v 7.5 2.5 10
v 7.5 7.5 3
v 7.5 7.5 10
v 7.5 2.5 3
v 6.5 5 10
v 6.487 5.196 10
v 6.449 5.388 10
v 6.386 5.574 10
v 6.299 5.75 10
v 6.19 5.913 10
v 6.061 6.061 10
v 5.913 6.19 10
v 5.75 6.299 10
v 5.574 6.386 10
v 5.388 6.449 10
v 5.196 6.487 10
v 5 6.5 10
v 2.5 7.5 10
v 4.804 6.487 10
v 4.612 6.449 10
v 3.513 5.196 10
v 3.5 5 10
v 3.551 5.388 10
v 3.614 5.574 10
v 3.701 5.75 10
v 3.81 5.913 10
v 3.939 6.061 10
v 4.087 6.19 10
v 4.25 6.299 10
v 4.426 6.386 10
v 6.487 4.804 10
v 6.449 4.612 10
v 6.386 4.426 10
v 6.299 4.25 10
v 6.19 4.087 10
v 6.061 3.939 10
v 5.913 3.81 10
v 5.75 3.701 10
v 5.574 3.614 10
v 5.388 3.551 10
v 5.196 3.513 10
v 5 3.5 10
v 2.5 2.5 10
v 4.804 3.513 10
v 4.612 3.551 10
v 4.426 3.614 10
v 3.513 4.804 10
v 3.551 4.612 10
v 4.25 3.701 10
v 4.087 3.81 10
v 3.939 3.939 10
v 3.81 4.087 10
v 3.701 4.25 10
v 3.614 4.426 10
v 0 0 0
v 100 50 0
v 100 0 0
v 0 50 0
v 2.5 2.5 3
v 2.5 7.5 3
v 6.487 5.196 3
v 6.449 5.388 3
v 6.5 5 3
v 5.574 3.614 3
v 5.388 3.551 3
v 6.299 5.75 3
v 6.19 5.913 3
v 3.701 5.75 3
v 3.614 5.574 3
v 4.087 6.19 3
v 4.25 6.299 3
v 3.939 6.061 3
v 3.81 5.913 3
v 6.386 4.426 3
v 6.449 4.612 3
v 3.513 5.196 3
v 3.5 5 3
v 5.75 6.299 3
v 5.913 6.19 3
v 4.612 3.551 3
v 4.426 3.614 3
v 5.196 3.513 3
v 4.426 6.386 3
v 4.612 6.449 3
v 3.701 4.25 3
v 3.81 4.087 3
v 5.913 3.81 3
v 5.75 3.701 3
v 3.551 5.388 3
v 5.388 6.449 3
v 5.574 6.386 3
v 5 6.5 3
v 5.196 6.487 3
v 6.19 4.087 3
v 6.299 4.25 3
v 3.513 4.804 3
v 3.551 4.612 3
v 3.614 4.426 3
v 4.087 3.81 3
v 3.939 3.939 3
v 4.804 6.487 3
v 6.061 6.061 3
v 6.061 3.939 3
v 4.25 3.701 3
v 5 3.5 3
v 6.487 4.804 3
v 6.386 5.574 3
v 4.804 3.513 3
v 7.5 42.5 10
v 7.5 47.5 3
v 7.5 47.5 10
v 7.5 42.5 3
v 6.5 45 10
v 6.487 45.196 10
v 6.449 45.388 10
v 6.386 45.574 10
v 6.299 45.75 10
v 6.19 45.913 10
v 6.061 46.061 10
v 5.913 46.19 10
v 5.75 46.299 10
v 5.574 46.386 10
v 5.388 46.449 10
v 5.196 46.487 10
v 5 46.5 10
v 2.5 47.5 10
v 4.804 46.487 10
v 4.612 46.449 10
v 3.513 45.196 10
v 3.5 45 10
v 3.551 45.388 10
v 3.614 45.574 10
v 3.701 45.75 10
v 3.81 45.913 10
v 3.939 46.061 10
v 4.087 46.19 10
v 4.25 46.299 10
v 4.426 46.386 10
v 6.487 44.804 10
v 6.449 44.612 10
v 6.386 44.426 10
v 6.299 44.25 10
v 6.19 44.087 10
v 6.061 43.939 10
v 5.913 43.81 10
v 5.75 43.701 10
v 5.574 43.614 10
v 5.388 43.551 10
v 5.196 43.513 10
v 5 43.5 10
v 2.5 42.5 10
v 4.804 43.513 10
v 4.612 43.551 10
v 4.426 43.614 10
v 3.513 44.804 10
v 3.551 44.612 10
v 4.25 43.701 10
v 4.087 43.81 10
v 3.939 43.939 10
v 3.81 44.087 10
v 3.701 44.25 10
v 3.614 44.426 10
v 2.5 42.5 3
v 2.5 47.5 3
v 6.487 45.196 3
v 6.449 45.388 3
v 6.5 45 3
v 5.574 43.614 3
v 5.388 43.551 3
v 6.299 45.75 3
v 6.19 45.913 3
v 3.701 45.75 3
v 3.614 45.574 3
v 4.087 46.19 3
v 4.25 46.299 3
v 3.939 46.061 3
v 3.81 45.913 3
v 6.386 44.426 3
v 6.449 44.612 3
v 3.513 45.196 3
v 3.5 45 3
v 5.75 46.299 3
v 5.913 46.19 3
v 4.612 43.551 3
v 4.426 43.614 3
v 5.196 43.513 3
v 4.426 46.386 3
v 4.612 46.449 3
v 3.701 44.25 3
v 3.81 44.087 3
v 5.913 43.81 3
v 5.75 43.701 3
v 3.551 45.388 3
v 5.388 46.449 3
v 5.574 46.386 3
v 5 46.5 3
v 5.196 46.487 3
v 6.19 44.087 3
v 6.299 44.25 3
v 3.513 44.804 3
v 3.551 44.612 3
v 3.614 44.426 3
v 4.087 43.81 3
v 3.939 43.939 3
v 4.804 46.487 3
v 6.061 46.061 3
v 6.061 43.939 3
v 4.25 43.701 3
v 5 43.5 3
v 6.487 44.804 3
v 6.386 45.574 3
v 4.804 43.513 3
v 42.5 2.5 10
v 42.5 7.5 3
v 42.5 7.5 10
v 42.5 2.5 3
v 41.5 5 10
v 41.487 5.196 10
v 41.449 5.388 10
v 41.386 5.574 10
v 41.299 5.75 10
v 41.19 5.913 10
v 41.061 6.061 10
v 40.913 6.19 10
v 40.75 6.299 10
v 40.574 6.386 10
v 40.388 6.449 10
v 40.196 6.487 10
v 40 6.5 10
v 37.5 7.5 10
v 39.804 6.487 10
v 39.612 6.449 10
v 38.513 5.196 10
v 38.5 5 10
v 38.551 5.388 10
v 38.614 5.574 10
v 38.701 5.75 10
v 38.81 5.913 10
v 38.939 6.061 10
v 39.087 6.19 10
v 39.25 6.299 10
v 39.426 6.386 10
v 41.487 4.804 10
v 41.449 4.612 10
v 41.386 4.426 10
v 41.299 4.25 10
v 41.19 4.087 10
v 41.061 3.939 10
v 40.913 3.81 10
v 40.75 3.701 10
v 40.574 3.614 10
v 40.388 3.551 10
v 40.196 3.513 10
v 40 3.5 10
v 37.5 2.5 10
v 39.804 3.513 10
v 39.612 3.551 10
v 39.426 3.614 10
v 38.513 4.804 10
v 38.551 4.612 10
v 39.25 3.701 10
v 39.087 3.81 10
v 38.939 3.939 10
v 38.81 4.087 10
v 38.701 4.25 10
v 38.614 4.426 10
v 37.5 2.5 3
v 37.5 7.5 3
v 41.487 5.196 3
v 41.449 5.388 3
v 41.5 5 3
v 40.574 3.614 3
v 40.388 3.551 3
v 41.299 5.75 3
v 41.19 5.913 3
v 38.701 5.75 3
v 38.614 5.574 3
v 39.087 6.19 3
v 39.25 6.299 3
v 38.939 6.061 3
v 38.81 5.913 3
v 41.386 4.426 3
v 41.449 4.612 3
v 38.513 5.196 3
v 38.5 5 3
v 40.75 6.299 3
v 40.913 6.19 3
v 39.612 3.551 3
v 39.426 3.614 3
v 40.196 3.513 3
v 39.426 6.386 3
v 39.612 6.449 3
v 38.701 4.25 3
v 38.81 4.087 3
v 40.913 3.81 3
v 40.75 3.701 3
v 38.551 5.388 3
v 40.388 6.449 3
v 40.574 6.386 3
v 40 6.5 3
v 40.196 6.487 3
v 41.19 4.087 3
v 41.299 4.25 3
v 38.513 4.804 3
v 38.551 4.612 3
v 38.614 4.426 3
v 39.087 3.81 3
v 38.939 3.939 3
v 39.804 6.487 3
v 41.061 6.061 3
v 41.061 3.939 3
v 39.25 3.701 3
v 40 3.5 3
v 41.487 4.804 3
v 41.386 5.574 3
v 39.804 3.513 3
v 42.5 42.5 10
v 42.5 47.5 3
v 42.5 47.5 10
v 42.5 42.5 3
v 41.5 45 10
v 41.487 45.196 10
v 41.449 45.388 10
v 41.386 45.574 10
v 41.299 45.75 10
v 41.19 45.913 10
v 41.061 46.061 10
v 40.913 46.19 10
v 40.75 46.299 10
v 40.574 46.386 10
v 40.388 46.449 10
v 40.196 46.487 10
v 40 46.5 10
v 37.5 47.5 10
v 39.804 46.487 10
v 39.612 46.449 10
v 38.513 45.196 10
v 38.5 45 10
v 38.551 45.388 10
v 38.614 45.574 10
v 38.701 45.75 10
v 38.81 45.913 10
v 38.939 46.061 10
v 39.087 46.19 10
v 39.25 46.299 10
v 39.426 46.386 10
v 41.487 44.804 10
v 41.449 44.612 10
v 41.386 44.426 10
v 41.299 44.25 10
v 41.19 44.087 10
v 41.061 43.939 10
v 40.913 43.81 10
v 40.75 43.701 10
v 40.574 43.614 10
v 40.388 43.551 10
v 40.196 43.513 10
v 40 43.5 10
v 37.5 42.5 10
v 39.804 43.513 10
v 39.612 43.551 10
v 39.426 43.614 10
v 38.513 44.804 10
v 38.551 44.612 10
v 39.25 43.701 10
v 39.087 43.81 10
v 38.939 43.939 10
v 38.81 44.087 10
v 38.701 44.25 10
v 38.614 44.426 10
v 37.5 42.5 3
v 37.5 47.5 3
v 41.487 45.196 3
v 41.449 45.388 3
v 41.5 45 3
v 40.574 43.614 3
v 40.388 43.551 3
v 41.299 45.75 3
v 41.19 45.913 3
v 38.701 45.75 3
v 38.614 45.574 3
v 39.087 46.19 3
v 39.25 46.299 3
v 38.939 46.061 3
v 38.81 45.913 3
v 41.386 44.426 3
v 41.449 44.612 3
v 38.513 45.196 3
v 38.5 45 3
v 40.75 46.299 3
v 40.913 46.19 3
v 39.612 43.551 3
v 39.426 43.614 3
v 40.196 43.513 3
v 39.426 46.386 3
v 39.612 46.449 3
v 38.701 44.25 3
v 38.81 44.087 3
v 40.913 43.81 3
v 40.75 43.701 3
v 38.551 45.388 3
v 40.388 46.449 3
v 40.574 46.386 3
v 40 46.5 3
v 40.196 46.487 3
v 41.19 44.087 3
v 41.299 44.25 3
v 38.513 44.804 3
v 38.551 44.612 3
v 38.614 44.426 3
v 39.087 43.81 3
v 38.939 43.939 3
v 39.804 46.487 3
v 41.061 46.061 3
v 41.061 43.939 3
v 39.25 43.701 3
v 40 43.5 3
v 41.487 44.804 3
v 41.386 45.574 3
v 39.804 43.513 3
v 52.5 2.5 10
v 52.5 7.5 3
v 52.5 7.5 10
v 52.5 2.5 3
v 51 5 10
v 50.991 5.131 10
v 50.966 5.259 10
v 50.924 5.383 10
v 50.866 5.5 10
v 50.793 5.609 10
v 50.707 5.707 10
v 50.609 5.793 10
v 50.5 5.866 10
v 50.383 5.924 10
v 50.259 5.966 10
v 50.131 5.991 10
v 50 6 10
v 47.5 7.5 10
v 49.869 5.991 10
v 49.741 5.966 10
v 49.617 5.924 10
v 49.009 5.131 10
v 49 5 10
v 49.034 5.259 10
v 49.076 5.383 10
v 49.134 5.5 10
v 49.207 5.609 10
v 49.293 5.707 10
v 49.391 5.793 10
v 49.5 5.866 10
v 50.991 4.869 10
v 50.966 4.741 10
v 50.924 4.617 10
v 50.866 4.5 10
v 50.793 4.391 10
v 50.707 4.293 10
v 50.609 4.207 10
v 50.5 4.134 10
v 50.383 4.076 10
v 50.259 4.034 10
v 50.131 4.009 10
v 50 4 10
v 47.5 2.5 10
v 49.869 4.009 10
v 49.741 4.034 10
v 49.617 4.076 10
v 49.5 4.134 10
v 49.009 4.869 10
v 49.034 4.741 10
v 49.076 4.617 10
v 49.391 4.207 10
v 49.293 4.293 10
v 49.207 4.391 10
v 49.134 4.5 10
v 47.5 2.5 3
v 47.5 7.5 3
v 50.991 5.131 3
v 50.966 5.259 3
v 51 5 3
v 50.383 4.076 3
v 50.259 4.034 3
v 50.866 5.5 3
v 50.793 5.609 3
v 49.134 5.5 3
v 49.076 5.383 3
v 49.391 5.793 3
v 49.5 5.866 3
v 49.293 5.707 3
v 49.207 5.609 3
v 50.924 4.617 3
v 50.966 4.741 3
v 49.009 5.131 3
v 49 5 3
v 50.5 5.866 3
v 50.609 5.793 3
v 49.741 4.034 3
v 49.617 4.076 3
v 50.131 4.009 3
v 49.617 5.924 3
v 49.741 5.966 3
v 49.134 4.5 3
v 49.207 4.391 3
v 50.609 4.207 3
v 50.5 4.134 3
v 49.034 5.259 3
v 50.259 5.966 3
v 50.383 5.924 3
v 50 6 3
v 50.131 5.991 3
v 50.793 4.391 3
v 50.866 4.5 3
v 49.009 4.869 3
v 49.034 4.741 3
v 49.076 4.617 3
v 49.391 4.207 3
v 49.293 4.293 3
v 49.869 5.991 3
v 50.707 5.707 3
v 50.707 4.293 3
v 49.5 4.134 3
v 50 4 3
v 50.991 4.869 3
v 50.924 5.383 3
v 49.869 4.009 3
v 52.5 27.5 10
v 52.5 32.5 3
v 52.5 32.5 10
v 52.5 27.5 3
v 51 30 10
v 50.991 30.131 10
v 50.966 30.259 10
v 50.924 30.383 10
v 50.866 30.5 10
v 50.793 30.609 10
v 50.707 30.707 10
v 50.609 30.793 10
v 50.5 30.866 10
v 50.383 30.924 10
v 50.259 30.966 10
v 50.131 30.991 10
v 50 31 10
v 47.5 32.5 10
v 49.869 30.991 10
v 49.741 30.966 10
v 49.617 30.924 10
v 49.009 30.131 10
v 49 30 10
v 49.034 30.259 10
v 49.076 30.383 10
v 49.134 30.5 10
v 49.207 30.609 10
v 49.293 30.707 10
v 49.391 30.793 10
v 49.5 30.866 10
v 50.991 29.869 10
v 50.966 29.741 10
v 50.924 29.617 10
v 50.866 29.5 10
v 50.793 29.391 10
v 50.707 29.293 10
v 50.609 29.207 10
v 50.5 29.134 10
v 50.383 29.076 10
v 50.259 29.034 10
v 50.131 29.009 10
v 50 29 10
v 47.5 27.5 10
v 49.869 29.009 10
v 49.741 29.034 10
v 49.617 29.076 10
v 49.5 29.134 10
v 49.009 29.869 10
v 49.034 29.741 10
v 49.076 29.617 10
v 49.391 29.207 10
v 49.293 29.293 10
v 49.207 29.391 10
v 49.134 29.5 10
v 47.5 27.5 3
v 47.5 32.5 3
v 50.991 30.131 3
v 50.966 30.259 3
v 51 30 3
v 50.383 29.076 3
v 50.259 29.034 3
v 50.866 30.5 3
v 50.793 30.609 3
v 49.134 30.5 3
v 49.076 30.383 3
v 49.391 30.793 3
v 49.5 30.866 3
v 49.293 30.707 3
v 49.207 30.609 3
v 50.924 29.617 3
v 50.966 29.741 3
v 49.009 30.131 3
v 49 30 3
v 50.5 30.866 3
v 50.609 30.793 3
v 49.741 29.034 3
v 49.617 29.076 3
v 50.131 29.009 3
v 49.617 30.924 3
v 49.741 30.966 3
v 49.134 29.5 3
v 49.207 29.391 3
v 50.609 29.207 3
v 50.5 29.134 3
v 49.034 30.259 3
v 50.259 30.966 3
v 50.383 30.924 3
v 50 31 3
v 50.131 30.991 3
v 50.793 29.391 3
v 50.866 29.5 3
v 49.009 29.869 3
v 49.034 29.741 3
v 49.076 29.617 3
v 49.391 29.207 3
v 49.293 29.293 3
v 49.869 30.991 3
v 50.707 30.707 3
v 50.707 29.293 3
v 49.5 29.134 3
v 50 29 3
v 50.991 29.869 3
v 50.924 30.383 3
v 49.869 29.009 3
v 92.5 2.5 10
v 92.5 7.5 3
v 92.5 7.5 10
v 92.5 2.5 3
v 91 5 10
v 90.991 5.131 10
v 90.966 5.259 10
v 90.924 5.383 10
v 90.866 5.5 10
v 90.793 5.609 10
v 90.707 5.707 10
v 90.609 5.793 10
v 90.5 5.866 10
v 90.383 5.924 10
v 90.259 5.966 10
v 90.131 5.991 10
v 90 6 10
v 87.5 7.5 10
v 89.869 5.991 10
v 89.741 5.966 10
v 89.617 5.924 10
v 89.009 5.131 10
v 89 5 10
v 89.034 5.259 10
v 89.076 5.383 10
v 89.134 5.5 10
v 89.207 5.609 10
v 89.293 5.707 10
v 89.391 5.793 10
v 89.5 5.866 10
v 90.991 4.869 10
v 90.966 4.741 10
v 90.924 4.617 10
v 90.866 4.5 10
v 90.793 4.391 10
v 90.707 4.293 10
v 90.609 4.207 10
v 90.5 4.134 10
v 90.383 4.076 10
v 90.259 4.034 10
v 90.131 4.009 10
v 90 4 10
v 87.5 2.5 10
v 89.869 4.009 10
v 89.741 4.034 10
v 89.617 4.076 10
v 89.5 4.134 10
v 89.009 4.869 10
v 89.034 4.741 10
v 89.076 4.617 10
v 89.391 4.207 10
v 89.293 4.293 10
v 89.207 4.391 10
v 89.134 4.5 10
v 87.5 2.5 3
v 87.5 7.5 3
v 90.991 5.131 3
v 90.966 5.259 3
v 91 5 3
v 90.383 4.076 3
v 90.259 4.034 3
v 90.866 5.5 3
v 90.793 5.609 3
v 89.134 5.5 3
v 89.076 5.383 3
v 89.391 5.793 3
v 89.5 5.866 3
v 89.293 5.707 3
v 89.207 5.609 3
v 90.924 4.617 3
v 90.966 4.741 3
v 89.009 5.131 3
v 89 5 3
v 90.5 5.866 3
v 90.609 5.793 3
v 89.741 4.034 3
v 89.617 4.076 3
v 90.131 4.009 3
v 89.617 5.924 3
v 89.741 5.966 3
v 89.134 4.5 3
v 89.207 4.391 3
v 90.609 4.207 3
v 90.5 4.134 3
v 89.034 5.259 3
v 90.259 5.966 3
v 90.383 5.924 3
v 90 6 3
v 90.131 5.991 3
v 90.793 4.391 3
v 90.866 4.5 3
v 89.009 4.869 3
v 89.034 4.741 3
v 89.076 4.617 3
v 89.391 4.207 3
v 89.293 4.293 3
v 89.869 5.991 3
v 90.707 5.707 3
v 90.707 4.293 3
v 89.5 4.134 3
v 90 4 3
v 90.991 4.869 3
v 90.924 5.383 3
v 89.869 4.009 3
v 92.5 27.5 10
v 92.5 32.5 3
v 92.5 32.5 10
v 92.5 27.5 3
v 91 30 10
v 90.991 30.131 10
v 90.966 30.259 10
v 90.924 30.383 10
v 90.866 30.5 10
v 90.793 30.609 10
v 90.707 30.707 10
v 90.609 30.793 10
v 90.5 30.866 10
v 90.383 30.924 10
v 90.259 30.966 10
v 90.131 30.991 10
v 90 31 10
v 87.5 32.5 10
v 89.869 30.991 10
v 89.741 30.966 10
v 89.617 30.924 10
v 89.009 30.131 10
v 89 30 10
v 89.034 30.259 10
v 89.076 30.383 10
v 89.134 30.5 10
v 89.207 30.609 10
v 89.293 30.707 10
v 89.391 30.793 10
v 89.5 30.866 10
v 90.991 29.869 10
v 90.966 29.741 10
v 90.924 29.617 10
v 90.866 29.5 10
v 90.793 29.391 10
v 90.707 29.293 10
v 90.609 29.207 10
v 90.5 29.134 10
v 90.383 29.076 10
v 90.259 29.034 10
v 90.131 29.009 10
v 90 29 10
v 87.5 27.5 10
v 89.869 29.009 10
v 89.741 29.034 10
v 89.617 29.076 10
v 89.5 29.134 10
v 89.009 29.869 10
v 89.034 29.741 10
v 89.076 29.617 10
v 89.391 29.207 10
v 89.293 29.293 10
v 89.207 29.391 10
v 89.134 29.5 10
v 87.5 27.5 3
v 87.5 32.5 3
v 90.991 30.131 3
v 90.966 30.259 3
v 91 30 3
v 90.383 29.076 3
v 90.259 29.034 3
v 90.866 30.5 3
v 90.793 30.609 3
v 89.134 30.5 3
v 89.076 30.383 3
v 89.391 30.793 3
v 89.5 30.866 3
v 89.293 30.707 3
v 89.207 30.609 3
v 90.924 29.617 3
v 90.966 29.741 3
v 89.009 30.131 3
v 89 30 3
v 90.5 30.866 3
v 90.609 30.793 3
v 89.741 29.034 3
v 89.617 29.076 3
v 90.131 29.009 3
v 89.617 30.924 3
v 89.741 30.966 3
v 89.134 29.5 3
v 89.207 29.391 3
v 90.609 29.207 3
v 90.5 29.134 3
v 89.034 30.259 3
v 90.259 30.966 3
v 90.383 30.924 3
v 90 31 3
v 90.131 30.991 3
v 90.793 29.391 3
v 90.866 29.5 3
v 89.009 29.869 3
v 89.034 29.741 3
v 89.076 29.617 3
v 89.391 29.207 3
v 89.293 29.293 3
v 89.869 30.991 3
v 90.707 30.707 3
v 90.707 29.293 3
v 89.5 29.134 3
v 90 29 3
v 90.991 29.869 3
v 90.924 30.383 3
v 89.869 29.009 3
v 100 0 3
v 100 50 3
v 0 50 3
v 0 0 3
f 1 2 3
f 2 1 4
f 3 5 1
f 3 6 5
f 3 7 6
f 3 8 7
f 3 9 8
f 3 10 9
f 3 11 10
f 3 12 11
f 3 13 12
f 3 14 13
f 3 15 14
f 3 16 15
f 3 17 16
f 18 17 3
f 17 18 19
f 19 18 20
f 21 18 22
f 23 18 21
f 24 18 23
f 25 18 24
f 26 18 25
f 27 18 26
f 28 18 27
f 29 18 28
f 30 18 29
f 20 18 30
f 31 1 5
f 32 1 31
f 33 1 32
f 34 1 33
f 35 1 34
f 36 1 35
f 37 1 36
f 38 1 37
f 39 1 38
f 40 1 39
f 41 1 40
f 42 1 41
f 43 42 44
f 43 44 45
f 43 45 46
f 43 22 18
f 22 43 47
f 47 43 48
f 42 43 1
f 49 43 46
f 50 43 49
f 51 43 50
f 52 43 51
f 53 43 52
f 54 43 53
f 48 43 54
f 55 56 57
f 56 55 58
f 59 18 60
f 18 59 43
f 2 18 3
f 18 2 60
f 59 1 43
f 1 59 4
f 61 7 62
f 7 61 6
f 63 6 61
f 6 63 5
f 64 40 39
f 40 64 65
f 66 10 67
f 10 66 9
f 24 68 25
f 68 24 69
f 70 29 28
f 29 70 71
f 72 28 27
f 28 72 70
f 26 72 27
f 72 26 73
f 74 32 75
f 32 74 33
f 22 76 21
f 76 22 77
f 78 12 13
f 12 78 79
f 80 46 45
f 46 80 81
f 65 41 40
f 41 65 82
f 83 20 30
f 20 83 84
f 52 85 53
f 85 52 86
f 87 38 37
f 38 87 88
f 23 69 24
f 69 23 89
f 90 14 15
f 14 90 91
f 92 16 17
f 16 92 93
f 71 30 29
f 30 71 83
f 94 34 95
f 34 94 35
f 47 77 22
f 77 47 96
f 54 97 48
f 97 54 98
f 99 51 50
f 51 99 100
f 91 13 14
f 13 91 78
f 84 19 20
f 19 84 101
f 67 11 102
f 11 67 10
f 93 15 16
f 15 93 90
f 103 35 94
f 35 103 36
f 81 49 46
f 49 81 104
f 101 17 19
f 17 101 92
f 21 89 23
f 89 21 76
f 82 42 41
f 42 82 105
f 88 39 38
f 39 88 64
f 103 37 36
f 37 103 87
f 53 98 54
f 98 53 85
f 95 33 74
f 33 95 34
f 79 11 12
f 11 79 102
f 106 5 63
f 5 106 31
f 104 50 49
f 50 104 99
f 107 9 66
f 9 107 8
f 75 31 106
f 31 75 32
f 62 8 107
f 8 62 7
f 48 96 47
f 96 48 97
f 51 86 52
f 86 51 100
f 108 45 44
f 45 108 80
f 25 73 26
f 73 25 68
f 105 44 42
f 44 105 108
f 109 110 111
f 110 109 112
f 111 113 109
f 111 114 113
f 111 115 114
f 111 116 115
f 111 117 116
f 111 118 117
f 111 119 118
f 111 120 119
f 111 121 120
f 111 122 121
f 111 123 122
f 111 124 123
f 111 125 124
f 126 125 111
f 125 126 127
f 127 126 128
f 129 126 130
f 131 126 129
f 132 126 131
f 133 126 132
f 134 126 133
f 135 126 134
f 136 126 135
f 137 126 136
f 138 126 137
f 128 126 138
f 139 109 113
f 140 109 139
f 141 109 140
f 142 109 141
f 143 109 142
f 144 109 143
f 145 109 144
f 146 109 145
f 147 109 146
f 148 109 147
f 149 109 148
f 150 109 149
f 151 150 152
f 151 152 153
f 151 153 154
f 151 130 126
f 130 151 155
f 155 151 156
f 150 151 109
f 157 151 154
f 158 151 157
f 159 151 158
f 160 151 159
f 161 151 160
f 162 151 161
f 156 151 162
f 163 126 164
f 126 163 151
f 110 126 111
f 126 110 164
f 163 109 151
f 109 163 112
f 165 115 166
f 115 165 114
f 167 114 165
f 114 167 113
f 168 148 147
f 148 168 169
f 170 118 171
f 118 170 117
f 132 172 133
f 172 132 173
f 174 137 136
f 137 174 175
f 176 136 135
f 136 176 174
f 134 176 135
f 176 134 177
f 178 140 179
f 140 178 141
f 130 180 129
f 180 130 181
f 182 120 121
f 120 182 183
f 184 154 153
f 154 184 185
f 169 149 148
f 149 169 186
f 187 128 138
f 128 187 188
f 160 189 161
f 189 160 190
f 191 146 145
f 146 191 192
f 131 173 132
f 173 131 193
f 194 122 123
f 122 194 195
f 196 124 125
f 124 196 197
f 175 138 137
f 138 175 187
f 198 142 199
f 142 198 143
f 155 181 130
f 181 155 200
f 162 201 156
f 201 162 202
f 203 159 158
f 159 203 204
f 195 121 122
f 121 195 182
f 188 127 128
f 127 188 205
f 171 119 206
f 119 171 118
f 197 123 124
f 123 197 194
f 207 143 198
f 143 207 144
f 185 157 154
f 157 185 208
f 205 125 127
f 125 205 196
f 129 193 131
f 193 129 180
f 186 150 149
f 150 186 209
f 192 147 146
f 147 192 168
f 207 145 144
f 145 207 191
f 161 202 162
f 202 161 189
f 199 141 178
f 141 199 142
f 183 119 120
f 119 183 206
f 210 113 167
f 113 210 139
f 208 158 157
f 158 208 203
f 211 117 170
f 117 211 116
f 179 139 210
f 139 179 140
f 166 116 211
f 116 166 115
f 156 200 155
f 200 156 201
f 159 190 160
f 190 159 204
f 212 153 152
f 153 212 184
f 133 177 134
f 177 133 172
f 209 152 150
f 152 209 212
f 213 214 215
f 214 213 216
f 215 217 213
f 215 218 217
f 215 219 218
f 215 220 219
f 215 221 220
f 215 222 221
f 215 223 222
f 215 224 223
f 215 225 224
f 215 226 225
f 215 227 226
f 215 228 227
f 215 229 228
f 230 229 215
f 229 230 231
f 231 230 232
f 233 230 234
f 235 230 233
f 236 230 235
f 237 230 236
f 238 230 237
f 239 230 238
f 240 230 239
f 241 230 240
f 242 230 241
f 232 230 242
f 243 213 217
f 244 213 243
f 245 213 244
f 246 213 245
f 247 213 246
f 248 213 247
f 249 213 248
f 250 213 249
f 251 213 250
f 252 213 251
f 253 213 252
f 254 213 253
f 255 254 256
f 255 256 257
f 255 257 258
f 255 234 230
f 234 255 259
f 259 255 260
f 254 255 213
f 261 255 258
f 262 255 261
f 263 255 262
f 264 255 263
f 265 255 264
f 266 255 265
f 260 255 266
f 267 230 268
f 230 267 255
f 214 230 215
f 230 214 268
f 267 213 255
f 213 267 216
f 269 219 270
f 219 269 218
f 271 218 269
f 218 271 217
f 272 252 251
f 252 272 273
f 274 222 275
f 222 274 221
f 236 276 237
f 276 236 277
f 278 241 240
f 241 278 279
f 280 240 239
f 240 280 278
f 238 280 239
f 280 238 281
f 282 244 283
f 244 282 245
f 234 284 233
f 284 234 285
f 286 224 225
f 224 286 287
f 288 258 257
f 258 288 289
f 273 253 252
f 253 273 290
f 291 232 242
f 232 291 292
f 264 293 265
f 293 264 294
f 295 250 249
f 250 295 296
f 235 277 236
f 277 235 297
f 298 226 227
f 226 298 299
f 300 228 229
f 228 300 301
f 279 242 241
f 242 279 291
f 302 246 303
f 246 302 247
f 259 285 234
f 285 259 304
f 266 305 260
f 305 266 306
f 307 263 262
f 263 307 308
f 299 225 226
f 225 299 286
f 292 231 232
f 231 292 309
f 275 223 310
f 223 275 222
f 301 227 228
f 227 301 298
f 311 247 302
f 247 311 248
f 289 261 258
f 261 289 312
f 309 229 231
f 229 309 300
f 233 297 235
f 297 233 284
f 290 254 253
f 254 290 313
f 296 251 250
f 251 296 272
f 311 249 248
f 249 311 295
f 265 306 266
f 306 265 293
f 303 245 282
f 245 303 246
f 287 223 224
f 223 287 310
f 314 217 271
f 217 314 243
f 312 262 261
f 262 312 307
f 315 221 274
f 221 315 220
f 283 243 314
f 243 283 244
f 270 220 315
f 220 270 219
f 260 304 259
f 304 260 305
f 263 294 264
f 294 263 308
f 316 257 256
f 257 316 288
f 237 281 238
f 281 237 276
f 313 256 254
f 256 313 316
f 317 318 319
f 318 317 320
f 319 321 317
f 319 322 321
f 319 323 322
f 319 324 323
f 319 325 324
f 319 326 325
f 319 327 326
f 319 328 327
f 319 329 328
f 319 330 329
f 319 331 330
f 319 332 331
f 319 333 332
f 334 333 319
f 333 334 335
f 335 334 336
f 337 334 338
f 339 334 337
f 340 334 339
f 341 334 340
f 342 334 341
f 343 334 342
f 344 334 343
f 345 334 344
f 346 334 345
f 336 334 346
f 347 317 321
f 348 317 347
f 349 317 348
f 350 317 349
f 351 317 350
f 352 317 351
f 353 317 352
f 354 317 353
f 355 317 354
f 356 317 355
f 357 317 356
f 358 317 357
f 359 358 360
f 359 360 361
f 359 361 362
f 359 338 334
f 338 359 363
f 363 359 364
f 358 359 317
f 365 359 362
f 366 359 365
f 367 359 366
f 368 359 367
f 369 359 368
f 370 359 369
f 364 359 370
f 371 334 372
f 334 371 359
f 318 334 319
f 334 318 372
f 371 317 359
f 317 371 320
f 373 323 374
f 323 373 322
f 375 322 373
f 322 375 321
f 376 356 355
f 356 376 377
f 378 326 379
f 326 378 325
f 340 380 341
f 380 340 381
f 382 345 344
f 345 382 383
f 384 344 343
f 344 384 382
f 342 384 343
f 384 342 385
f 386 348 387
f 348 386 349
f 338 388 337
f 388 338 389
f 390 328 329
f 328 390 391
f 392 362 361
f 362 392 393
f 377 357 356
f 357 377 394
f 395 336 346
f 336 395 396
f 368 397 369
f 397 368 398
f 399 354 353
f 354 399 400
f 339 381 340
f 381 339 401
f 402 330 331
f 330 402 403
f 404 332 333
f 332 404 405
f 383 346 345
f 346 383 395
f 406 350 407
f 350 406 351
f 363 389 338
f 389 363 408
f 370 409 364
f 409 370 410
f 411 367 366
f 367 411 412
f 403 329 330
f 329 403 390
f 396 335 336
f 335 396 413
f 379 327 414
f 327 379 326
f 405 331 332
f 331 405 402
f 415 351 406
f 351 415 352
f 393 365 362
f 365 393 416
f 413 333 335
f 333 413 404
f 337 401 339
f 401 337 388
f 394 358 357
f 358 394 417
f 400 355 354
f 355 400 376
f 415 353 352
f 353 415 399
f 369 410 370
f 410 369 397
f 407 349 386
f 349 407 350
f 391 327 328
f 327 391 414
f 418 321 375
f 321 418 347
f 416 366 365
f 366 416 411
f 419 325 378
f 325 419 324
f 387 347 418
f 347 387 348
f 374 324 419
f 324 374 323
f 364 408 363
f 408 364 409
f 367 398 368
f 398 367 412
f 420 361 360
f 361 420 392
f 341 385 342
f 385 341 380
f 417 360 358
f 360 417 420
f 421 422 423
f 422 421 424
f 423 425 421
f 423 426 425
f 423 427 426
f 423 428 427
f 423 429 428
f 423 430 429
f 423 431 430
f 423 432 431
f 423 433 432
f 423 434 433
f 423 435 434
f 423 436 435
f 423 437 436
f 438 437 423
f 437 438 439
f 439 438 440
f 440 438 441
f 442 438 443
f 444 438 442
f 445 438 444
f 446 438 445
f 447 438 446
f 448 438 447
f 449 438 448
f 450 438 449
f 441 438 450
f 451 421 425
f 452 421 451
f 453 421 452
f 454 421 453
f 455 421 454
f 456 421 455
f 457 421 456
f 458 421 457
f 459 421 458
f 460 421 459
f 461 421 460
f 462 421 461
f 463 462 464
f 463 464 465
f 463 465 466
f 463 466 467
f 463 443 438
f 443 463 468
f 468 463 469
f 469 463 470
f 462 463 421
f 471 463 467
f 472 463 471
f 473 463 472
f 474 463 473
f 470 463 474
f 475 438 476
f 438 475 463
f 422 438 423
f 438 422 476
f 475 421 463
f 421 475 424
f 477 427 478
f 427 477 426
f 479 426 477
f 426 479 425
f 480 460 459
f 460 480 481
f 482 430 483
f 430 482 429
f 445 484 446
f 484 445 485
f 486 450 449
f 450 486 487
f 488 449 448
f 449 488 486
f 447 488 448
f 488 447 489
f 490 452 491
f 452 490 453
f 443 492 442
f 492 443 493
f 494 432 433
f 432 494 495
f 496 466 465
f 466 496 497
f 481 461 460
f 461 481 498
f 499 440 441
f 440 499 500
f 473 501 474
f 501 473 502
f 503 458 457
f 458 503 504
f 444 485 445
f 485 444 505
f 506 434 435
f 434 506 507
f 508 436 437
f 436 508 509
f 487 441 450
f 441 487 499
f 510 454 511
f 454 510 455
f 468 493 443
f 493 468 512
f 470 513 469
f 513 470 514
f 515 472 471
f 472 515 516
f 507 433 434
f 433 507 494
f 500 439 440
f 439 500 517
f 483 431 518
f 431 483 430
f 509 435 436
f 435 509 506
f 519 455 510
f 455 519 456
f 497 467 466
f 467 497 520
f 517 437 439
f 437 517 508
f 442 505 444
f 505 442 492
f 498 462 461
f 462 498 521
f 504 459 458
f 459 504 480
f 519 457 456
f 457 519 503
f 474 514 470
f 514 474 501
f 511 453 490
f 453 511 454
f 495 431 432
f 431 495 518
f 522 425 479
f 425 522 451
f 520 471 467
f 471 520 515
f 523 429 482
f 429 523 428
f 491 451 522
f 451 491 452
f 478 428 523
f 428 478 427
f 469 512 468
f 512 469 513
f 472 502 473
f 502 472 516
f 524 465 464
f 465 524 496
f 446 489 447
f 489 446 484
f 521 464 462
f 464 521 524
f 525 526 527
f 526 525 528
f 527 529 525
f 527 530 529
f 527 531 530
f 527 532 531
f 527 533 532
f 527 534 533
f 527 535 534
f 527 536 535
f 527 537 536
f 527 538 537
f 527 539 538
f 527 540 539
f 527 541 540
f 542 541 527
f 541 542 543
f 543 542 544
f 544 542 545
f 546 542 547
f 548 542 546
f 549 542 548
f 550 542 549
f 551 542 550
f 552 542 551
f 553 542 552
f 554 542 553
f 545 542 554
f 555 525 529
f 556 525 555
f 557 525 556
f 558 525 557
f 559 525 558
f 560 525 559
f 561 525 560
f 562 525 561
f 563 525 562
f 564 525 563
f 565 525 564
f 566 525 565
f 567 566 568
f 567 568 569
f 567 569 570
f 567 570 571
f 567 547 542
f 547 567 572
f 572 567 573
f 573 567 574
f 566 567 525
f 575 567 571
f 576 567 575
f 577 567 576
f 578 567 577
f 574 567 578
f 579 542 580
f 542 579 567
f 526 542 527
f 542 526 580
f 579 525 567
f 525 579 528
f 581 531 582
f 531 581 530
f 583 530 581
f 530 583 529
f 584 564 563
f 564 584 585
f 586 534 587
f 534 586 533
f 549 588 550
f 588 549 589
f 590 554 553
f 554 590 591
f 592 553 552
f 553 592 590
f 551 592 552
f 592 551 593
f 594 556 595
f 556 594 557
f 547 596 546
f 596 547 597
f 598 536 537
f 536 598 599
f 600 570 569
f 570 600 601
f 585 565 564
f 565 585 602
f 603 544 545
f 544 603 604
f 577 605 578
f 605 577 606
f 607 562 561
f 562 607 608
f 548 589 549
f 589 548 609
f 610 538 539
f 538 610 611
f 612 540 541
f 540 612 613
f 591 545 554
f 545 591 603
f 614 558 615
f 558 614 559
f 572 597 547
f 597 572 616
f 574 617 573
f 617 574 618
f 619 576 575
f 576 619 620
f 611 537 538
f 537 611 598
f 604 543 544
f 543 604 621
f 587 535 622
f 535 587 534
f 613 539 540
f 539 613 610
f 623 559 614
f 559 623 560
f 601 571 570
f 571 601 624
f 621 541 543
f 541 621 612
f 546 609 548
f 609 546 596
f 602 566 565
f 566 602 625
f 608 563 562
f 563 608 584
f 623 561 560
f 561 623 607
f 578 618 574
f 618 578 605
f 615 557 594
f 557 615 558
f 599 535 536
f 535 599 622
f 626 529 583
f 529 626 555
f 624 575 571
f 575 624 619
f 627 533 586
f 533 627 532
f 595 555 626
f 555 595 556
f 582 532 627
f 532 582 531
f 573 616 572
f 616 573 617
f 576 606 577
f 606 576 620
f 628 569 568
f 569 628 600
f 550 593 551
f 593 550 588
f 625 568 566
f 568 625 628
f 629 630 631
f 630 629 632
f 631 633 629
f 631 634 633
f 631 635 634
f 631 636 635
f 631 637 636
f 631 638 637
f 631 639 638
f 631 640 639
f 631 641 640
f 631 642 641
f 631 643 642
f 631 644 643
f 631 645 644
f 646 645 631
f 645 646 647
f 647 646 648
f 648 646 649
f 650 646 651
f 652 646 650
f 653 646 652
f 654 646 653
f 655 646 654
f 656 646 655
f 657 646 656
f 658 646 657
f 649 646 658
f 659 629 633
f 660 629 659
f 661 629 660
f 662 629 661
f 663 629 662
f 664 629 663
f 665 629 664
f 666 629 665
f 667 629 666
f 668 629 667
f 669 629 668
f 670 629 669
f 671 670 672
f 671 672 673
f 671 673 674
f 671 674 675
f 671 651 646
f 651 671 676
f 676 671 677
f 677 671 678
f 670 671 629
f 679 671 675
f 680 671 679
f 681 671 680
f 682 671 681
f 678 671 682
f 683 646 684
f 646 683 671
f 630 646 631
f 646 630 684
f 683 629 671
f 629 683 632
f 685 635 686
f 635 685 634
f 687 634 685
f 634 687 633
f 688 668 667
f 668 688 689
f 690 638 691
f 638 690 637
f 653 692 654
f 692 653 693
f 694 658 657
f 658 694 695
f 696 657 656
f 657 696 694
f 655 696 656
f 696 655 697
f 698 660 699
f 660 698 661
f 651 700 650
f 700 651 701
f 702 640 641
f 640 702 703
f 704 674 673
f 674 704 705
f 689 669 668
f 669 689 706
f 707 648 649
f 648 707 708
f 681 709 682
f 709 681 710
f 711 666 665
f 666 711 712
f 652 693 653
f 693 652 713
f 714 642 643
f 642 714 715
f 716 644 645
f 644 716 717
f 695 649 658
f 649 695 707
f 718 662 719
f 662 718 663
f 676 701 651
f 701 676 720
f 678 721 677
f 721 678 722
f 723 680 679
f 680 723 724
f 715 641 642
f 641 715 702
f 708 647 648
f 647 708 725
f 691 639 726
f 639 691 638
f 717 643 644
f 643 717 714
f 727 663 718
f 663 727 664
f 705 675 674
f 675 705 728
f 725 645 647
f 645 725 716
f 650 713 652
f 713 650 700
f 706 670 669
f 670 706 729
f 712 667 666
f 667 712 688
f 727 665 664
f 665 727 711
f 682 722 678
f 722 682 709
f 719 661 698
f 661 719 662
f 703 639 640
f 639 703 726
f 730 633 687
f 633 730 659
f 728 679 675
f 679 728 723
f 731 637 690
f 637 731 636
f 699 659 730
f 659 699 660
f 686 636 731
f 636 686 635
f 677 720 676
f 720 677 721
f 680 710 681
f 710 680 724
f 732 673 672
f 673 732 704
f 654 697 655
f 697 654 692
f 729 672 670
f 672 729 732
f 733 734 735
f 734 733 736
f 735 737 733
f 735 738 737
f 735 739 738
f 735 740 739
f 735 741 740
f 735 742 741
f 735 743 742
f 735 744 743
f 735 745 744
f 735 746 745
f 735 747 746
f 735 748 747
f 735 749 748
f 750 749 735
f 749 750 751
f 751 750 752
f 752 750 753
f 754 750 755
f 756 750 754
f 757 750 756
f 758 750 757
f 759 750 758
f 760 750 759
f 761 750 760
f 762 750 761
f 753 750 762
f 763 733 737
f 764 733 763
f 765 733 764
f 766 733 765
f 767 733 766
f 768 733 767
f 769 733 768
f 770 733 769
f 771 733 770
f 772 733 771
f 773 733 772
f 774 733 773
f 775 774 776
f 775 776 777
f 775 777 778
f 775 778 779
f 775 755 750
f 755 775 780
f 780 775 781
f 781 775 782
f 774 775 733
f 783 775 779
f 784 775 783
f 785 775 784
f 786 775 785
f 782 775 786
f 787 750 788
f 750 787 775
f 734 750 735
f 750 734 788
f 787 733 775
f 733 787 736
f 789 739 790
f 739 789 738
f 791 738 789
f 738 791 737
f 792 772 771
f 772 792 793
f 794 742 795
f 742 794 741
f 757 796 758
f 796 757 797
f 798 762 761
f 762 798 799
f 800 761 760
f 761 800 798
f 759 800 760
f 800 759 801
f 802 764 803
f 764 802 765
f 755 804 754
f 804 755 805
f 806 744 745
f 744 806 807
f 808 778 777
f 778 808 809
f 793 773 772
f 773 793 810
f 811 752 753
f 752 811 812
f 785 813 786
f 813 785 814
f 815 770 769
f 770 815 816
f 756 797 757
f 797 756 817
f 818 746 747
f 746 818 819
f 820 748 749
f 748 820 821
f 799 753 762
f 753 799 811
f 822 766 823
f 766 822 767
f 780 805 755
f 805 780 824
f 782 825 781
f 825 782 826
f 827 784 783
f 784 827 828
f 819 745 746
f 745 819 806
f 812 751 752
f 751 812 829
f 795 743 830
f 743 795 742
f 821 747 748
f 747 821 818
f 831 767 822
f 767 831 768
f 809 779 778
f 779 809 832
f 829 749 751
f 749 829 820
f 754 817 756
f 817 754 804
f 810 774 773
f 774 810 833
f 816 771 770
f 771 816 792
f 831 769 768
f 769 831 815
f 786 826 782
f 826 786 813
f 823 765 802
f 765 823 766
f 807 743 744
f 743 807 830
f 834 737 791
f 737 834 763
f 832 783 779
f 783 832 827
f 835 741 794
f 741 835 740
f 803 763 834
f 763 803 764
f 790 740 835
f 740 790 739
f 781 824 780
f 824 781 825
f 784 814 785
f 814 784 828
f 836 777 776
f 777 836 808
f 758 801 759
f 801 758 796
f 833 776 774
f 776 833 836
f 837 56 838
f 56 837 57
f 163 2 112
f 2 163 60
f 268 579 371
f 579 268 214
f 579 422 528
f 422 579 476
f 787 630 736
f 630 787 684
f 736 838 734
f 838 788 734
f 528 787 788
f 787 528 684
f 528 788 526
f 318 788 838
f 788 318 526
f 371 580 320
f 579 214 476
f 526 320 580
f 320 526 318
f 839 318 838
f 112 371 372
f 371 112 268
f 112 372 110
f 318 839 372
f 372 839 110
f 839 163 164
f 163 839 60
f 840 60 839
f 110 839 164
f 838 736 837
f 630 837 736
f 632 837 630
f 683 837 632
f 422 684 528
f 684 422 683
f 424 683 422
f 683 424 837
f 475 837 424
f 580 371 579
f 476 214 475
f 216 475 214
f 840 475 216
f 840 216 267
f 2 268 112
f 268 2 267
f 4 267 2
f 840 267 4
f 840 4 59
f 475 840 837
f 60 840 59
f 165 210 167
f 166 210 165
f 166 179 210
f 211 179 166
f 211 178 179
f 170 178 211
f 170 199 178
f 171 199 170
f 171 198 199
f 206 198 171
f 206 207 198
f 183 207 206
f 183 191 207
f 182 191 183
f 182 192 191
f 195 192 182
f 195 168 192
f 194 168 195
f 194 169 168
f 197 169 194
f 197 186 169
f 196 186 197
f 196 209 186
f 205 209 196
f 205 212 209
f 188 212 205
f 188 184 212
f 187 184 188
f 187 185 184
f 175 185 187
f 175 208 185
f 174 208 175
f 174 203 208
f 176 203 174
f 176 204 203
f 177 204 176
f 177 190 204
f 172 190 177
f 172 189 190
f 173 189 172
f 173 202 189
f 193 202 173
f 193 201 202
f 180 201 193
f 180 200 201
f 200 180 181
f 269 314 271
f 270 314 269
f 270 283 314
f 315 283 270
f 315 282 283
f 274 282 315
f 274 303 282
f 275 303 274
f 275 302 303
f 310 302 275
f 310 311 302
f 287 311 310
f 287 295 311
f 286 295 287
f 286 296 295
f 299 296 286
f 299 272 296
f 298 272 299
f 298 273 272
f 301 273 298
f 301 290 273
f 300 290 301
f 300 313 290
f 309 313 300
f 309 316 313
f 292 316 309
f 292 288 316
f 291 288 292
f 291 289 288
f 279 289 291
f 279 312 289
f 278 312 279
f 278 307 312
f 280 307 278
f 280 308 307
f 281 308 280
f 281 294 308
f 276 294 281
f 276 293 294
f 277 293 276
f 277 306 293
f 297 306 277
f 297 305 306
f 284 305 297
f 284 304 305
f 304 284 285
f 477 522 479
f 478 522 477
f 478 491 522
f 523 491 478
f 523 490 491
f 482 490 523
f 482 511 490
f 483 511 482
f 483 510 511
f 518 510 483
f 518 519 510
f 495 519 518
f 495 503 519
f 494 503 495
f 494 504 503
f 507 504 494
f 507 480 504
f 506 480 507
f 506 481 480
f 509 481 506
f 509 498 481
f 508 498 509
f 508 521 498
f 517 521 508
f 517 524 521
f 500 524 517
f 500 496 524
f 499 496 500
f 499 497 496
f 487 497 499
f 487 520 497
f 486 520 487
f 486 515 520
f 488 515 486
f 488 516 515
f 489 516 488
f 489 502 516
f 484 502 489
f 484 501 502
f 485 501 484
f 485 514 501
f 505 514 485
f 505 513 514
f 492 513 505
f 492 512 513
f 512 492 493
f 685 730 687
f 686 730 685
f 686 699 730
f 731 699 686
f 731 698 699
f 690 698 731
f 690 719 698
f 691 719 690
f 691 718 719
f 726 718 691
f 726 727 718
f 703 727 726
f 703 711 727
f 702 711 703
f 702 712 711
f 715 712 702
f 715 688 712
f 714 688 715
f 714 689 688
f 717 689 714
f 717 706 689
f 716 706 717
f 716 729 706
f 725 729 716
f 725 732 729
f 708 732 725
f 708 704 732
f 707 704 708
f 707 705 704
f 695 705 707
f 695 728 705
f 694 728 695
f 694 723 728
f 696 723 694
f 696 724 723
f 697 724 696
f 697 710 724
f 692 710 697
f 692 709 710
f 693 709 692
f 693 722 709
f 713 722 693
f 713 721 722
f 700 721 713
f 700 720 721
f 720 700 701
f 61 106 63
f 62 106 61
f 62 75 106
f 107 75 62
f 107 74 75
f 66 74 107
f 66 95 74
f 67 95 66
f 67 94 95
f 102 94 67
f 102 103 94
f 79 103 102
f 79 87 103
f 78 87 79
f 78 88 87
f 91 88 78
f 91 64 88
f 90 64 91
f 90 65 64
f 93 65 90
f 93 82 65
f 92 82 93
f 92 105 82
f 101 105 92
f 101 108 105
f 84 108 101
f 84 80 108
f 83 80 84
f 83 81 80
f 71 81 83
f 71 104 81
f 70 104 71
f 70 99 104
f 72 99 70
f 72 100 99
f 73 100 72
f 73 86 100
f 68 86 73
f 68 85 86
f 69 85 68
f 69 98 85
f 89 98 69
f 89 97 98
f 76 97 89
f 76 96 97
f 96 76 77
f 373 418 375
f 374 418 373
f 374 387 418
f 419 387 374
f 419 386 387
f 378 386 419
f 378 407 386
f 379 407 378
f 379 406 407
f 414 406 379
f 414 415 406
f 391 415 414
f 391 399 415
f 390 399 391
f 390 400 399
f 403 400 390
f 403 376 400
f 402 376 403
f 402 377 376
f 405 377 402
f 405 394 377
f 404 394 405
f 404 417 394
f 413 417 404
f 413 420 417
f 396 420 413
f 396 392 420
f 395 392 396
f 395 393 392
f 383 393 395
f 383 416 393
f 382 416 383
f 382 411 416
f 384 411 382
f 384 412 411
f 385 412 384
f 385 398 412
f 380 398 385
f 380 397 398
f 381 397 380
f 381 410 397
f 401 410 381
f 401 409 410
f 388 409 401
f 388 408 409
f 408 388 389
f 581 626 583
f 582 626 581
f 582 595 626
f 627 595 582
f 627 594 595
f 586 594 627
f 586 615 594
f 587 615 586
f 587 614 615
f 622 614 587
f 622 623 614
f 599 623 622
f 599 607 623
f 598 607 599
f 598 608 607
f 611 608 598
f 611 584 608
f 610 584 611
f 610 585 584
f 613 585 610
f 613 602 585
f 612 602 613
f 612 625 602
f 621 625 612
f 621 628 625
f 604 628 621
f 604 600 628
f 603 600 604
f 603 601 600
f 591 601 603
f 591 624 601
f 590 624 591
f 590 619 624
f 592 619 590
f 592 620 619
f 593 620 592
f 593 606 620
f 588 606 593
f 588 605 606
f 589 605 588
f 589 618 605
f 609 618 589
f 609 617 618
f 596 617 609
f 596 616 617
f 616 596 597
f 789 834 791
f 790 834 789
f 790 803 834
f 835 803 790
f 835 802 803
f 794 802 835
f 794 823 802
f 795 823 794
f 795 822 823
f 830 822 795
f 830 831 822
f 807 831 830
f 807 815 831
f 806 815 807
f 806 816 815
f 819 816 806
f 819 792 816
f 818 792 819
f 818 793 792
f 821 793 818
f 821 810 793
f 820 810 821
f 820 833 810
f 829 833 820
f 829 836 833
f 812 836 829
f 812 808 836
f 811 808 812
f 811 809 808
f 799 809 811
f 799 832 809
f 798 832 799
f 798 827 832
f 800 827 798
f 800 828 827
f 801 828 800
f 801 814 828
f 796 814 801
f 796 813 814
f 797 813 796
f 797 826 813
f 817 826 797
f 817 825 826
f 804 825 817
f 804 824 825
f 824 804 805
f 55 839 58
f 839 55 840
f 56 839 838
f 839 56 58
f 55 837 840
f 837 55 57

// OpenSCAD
$fn=48;
union(){
	cube([100,50,3]);
	translate([5,5,0]) pata(1.5);
	translate([5,45,0]) pata(1.5);
	translate([40,5,0]) pata(1.5);
	translate([40,45,0]) pata(1.5);
	translate([50,5,0]) pata(1);
	translate([50,30,0]) pata(1);
	translate([90,5,0]) pata(1);
	translate([90,30,0]) pata(1);
}

module pata(r){
	difference(){
		translate([-2.5,-2.5,0]) cube([5,5,10]);
		cylinder(h=10, r=r); // agujero en (0,0)
	}
}
